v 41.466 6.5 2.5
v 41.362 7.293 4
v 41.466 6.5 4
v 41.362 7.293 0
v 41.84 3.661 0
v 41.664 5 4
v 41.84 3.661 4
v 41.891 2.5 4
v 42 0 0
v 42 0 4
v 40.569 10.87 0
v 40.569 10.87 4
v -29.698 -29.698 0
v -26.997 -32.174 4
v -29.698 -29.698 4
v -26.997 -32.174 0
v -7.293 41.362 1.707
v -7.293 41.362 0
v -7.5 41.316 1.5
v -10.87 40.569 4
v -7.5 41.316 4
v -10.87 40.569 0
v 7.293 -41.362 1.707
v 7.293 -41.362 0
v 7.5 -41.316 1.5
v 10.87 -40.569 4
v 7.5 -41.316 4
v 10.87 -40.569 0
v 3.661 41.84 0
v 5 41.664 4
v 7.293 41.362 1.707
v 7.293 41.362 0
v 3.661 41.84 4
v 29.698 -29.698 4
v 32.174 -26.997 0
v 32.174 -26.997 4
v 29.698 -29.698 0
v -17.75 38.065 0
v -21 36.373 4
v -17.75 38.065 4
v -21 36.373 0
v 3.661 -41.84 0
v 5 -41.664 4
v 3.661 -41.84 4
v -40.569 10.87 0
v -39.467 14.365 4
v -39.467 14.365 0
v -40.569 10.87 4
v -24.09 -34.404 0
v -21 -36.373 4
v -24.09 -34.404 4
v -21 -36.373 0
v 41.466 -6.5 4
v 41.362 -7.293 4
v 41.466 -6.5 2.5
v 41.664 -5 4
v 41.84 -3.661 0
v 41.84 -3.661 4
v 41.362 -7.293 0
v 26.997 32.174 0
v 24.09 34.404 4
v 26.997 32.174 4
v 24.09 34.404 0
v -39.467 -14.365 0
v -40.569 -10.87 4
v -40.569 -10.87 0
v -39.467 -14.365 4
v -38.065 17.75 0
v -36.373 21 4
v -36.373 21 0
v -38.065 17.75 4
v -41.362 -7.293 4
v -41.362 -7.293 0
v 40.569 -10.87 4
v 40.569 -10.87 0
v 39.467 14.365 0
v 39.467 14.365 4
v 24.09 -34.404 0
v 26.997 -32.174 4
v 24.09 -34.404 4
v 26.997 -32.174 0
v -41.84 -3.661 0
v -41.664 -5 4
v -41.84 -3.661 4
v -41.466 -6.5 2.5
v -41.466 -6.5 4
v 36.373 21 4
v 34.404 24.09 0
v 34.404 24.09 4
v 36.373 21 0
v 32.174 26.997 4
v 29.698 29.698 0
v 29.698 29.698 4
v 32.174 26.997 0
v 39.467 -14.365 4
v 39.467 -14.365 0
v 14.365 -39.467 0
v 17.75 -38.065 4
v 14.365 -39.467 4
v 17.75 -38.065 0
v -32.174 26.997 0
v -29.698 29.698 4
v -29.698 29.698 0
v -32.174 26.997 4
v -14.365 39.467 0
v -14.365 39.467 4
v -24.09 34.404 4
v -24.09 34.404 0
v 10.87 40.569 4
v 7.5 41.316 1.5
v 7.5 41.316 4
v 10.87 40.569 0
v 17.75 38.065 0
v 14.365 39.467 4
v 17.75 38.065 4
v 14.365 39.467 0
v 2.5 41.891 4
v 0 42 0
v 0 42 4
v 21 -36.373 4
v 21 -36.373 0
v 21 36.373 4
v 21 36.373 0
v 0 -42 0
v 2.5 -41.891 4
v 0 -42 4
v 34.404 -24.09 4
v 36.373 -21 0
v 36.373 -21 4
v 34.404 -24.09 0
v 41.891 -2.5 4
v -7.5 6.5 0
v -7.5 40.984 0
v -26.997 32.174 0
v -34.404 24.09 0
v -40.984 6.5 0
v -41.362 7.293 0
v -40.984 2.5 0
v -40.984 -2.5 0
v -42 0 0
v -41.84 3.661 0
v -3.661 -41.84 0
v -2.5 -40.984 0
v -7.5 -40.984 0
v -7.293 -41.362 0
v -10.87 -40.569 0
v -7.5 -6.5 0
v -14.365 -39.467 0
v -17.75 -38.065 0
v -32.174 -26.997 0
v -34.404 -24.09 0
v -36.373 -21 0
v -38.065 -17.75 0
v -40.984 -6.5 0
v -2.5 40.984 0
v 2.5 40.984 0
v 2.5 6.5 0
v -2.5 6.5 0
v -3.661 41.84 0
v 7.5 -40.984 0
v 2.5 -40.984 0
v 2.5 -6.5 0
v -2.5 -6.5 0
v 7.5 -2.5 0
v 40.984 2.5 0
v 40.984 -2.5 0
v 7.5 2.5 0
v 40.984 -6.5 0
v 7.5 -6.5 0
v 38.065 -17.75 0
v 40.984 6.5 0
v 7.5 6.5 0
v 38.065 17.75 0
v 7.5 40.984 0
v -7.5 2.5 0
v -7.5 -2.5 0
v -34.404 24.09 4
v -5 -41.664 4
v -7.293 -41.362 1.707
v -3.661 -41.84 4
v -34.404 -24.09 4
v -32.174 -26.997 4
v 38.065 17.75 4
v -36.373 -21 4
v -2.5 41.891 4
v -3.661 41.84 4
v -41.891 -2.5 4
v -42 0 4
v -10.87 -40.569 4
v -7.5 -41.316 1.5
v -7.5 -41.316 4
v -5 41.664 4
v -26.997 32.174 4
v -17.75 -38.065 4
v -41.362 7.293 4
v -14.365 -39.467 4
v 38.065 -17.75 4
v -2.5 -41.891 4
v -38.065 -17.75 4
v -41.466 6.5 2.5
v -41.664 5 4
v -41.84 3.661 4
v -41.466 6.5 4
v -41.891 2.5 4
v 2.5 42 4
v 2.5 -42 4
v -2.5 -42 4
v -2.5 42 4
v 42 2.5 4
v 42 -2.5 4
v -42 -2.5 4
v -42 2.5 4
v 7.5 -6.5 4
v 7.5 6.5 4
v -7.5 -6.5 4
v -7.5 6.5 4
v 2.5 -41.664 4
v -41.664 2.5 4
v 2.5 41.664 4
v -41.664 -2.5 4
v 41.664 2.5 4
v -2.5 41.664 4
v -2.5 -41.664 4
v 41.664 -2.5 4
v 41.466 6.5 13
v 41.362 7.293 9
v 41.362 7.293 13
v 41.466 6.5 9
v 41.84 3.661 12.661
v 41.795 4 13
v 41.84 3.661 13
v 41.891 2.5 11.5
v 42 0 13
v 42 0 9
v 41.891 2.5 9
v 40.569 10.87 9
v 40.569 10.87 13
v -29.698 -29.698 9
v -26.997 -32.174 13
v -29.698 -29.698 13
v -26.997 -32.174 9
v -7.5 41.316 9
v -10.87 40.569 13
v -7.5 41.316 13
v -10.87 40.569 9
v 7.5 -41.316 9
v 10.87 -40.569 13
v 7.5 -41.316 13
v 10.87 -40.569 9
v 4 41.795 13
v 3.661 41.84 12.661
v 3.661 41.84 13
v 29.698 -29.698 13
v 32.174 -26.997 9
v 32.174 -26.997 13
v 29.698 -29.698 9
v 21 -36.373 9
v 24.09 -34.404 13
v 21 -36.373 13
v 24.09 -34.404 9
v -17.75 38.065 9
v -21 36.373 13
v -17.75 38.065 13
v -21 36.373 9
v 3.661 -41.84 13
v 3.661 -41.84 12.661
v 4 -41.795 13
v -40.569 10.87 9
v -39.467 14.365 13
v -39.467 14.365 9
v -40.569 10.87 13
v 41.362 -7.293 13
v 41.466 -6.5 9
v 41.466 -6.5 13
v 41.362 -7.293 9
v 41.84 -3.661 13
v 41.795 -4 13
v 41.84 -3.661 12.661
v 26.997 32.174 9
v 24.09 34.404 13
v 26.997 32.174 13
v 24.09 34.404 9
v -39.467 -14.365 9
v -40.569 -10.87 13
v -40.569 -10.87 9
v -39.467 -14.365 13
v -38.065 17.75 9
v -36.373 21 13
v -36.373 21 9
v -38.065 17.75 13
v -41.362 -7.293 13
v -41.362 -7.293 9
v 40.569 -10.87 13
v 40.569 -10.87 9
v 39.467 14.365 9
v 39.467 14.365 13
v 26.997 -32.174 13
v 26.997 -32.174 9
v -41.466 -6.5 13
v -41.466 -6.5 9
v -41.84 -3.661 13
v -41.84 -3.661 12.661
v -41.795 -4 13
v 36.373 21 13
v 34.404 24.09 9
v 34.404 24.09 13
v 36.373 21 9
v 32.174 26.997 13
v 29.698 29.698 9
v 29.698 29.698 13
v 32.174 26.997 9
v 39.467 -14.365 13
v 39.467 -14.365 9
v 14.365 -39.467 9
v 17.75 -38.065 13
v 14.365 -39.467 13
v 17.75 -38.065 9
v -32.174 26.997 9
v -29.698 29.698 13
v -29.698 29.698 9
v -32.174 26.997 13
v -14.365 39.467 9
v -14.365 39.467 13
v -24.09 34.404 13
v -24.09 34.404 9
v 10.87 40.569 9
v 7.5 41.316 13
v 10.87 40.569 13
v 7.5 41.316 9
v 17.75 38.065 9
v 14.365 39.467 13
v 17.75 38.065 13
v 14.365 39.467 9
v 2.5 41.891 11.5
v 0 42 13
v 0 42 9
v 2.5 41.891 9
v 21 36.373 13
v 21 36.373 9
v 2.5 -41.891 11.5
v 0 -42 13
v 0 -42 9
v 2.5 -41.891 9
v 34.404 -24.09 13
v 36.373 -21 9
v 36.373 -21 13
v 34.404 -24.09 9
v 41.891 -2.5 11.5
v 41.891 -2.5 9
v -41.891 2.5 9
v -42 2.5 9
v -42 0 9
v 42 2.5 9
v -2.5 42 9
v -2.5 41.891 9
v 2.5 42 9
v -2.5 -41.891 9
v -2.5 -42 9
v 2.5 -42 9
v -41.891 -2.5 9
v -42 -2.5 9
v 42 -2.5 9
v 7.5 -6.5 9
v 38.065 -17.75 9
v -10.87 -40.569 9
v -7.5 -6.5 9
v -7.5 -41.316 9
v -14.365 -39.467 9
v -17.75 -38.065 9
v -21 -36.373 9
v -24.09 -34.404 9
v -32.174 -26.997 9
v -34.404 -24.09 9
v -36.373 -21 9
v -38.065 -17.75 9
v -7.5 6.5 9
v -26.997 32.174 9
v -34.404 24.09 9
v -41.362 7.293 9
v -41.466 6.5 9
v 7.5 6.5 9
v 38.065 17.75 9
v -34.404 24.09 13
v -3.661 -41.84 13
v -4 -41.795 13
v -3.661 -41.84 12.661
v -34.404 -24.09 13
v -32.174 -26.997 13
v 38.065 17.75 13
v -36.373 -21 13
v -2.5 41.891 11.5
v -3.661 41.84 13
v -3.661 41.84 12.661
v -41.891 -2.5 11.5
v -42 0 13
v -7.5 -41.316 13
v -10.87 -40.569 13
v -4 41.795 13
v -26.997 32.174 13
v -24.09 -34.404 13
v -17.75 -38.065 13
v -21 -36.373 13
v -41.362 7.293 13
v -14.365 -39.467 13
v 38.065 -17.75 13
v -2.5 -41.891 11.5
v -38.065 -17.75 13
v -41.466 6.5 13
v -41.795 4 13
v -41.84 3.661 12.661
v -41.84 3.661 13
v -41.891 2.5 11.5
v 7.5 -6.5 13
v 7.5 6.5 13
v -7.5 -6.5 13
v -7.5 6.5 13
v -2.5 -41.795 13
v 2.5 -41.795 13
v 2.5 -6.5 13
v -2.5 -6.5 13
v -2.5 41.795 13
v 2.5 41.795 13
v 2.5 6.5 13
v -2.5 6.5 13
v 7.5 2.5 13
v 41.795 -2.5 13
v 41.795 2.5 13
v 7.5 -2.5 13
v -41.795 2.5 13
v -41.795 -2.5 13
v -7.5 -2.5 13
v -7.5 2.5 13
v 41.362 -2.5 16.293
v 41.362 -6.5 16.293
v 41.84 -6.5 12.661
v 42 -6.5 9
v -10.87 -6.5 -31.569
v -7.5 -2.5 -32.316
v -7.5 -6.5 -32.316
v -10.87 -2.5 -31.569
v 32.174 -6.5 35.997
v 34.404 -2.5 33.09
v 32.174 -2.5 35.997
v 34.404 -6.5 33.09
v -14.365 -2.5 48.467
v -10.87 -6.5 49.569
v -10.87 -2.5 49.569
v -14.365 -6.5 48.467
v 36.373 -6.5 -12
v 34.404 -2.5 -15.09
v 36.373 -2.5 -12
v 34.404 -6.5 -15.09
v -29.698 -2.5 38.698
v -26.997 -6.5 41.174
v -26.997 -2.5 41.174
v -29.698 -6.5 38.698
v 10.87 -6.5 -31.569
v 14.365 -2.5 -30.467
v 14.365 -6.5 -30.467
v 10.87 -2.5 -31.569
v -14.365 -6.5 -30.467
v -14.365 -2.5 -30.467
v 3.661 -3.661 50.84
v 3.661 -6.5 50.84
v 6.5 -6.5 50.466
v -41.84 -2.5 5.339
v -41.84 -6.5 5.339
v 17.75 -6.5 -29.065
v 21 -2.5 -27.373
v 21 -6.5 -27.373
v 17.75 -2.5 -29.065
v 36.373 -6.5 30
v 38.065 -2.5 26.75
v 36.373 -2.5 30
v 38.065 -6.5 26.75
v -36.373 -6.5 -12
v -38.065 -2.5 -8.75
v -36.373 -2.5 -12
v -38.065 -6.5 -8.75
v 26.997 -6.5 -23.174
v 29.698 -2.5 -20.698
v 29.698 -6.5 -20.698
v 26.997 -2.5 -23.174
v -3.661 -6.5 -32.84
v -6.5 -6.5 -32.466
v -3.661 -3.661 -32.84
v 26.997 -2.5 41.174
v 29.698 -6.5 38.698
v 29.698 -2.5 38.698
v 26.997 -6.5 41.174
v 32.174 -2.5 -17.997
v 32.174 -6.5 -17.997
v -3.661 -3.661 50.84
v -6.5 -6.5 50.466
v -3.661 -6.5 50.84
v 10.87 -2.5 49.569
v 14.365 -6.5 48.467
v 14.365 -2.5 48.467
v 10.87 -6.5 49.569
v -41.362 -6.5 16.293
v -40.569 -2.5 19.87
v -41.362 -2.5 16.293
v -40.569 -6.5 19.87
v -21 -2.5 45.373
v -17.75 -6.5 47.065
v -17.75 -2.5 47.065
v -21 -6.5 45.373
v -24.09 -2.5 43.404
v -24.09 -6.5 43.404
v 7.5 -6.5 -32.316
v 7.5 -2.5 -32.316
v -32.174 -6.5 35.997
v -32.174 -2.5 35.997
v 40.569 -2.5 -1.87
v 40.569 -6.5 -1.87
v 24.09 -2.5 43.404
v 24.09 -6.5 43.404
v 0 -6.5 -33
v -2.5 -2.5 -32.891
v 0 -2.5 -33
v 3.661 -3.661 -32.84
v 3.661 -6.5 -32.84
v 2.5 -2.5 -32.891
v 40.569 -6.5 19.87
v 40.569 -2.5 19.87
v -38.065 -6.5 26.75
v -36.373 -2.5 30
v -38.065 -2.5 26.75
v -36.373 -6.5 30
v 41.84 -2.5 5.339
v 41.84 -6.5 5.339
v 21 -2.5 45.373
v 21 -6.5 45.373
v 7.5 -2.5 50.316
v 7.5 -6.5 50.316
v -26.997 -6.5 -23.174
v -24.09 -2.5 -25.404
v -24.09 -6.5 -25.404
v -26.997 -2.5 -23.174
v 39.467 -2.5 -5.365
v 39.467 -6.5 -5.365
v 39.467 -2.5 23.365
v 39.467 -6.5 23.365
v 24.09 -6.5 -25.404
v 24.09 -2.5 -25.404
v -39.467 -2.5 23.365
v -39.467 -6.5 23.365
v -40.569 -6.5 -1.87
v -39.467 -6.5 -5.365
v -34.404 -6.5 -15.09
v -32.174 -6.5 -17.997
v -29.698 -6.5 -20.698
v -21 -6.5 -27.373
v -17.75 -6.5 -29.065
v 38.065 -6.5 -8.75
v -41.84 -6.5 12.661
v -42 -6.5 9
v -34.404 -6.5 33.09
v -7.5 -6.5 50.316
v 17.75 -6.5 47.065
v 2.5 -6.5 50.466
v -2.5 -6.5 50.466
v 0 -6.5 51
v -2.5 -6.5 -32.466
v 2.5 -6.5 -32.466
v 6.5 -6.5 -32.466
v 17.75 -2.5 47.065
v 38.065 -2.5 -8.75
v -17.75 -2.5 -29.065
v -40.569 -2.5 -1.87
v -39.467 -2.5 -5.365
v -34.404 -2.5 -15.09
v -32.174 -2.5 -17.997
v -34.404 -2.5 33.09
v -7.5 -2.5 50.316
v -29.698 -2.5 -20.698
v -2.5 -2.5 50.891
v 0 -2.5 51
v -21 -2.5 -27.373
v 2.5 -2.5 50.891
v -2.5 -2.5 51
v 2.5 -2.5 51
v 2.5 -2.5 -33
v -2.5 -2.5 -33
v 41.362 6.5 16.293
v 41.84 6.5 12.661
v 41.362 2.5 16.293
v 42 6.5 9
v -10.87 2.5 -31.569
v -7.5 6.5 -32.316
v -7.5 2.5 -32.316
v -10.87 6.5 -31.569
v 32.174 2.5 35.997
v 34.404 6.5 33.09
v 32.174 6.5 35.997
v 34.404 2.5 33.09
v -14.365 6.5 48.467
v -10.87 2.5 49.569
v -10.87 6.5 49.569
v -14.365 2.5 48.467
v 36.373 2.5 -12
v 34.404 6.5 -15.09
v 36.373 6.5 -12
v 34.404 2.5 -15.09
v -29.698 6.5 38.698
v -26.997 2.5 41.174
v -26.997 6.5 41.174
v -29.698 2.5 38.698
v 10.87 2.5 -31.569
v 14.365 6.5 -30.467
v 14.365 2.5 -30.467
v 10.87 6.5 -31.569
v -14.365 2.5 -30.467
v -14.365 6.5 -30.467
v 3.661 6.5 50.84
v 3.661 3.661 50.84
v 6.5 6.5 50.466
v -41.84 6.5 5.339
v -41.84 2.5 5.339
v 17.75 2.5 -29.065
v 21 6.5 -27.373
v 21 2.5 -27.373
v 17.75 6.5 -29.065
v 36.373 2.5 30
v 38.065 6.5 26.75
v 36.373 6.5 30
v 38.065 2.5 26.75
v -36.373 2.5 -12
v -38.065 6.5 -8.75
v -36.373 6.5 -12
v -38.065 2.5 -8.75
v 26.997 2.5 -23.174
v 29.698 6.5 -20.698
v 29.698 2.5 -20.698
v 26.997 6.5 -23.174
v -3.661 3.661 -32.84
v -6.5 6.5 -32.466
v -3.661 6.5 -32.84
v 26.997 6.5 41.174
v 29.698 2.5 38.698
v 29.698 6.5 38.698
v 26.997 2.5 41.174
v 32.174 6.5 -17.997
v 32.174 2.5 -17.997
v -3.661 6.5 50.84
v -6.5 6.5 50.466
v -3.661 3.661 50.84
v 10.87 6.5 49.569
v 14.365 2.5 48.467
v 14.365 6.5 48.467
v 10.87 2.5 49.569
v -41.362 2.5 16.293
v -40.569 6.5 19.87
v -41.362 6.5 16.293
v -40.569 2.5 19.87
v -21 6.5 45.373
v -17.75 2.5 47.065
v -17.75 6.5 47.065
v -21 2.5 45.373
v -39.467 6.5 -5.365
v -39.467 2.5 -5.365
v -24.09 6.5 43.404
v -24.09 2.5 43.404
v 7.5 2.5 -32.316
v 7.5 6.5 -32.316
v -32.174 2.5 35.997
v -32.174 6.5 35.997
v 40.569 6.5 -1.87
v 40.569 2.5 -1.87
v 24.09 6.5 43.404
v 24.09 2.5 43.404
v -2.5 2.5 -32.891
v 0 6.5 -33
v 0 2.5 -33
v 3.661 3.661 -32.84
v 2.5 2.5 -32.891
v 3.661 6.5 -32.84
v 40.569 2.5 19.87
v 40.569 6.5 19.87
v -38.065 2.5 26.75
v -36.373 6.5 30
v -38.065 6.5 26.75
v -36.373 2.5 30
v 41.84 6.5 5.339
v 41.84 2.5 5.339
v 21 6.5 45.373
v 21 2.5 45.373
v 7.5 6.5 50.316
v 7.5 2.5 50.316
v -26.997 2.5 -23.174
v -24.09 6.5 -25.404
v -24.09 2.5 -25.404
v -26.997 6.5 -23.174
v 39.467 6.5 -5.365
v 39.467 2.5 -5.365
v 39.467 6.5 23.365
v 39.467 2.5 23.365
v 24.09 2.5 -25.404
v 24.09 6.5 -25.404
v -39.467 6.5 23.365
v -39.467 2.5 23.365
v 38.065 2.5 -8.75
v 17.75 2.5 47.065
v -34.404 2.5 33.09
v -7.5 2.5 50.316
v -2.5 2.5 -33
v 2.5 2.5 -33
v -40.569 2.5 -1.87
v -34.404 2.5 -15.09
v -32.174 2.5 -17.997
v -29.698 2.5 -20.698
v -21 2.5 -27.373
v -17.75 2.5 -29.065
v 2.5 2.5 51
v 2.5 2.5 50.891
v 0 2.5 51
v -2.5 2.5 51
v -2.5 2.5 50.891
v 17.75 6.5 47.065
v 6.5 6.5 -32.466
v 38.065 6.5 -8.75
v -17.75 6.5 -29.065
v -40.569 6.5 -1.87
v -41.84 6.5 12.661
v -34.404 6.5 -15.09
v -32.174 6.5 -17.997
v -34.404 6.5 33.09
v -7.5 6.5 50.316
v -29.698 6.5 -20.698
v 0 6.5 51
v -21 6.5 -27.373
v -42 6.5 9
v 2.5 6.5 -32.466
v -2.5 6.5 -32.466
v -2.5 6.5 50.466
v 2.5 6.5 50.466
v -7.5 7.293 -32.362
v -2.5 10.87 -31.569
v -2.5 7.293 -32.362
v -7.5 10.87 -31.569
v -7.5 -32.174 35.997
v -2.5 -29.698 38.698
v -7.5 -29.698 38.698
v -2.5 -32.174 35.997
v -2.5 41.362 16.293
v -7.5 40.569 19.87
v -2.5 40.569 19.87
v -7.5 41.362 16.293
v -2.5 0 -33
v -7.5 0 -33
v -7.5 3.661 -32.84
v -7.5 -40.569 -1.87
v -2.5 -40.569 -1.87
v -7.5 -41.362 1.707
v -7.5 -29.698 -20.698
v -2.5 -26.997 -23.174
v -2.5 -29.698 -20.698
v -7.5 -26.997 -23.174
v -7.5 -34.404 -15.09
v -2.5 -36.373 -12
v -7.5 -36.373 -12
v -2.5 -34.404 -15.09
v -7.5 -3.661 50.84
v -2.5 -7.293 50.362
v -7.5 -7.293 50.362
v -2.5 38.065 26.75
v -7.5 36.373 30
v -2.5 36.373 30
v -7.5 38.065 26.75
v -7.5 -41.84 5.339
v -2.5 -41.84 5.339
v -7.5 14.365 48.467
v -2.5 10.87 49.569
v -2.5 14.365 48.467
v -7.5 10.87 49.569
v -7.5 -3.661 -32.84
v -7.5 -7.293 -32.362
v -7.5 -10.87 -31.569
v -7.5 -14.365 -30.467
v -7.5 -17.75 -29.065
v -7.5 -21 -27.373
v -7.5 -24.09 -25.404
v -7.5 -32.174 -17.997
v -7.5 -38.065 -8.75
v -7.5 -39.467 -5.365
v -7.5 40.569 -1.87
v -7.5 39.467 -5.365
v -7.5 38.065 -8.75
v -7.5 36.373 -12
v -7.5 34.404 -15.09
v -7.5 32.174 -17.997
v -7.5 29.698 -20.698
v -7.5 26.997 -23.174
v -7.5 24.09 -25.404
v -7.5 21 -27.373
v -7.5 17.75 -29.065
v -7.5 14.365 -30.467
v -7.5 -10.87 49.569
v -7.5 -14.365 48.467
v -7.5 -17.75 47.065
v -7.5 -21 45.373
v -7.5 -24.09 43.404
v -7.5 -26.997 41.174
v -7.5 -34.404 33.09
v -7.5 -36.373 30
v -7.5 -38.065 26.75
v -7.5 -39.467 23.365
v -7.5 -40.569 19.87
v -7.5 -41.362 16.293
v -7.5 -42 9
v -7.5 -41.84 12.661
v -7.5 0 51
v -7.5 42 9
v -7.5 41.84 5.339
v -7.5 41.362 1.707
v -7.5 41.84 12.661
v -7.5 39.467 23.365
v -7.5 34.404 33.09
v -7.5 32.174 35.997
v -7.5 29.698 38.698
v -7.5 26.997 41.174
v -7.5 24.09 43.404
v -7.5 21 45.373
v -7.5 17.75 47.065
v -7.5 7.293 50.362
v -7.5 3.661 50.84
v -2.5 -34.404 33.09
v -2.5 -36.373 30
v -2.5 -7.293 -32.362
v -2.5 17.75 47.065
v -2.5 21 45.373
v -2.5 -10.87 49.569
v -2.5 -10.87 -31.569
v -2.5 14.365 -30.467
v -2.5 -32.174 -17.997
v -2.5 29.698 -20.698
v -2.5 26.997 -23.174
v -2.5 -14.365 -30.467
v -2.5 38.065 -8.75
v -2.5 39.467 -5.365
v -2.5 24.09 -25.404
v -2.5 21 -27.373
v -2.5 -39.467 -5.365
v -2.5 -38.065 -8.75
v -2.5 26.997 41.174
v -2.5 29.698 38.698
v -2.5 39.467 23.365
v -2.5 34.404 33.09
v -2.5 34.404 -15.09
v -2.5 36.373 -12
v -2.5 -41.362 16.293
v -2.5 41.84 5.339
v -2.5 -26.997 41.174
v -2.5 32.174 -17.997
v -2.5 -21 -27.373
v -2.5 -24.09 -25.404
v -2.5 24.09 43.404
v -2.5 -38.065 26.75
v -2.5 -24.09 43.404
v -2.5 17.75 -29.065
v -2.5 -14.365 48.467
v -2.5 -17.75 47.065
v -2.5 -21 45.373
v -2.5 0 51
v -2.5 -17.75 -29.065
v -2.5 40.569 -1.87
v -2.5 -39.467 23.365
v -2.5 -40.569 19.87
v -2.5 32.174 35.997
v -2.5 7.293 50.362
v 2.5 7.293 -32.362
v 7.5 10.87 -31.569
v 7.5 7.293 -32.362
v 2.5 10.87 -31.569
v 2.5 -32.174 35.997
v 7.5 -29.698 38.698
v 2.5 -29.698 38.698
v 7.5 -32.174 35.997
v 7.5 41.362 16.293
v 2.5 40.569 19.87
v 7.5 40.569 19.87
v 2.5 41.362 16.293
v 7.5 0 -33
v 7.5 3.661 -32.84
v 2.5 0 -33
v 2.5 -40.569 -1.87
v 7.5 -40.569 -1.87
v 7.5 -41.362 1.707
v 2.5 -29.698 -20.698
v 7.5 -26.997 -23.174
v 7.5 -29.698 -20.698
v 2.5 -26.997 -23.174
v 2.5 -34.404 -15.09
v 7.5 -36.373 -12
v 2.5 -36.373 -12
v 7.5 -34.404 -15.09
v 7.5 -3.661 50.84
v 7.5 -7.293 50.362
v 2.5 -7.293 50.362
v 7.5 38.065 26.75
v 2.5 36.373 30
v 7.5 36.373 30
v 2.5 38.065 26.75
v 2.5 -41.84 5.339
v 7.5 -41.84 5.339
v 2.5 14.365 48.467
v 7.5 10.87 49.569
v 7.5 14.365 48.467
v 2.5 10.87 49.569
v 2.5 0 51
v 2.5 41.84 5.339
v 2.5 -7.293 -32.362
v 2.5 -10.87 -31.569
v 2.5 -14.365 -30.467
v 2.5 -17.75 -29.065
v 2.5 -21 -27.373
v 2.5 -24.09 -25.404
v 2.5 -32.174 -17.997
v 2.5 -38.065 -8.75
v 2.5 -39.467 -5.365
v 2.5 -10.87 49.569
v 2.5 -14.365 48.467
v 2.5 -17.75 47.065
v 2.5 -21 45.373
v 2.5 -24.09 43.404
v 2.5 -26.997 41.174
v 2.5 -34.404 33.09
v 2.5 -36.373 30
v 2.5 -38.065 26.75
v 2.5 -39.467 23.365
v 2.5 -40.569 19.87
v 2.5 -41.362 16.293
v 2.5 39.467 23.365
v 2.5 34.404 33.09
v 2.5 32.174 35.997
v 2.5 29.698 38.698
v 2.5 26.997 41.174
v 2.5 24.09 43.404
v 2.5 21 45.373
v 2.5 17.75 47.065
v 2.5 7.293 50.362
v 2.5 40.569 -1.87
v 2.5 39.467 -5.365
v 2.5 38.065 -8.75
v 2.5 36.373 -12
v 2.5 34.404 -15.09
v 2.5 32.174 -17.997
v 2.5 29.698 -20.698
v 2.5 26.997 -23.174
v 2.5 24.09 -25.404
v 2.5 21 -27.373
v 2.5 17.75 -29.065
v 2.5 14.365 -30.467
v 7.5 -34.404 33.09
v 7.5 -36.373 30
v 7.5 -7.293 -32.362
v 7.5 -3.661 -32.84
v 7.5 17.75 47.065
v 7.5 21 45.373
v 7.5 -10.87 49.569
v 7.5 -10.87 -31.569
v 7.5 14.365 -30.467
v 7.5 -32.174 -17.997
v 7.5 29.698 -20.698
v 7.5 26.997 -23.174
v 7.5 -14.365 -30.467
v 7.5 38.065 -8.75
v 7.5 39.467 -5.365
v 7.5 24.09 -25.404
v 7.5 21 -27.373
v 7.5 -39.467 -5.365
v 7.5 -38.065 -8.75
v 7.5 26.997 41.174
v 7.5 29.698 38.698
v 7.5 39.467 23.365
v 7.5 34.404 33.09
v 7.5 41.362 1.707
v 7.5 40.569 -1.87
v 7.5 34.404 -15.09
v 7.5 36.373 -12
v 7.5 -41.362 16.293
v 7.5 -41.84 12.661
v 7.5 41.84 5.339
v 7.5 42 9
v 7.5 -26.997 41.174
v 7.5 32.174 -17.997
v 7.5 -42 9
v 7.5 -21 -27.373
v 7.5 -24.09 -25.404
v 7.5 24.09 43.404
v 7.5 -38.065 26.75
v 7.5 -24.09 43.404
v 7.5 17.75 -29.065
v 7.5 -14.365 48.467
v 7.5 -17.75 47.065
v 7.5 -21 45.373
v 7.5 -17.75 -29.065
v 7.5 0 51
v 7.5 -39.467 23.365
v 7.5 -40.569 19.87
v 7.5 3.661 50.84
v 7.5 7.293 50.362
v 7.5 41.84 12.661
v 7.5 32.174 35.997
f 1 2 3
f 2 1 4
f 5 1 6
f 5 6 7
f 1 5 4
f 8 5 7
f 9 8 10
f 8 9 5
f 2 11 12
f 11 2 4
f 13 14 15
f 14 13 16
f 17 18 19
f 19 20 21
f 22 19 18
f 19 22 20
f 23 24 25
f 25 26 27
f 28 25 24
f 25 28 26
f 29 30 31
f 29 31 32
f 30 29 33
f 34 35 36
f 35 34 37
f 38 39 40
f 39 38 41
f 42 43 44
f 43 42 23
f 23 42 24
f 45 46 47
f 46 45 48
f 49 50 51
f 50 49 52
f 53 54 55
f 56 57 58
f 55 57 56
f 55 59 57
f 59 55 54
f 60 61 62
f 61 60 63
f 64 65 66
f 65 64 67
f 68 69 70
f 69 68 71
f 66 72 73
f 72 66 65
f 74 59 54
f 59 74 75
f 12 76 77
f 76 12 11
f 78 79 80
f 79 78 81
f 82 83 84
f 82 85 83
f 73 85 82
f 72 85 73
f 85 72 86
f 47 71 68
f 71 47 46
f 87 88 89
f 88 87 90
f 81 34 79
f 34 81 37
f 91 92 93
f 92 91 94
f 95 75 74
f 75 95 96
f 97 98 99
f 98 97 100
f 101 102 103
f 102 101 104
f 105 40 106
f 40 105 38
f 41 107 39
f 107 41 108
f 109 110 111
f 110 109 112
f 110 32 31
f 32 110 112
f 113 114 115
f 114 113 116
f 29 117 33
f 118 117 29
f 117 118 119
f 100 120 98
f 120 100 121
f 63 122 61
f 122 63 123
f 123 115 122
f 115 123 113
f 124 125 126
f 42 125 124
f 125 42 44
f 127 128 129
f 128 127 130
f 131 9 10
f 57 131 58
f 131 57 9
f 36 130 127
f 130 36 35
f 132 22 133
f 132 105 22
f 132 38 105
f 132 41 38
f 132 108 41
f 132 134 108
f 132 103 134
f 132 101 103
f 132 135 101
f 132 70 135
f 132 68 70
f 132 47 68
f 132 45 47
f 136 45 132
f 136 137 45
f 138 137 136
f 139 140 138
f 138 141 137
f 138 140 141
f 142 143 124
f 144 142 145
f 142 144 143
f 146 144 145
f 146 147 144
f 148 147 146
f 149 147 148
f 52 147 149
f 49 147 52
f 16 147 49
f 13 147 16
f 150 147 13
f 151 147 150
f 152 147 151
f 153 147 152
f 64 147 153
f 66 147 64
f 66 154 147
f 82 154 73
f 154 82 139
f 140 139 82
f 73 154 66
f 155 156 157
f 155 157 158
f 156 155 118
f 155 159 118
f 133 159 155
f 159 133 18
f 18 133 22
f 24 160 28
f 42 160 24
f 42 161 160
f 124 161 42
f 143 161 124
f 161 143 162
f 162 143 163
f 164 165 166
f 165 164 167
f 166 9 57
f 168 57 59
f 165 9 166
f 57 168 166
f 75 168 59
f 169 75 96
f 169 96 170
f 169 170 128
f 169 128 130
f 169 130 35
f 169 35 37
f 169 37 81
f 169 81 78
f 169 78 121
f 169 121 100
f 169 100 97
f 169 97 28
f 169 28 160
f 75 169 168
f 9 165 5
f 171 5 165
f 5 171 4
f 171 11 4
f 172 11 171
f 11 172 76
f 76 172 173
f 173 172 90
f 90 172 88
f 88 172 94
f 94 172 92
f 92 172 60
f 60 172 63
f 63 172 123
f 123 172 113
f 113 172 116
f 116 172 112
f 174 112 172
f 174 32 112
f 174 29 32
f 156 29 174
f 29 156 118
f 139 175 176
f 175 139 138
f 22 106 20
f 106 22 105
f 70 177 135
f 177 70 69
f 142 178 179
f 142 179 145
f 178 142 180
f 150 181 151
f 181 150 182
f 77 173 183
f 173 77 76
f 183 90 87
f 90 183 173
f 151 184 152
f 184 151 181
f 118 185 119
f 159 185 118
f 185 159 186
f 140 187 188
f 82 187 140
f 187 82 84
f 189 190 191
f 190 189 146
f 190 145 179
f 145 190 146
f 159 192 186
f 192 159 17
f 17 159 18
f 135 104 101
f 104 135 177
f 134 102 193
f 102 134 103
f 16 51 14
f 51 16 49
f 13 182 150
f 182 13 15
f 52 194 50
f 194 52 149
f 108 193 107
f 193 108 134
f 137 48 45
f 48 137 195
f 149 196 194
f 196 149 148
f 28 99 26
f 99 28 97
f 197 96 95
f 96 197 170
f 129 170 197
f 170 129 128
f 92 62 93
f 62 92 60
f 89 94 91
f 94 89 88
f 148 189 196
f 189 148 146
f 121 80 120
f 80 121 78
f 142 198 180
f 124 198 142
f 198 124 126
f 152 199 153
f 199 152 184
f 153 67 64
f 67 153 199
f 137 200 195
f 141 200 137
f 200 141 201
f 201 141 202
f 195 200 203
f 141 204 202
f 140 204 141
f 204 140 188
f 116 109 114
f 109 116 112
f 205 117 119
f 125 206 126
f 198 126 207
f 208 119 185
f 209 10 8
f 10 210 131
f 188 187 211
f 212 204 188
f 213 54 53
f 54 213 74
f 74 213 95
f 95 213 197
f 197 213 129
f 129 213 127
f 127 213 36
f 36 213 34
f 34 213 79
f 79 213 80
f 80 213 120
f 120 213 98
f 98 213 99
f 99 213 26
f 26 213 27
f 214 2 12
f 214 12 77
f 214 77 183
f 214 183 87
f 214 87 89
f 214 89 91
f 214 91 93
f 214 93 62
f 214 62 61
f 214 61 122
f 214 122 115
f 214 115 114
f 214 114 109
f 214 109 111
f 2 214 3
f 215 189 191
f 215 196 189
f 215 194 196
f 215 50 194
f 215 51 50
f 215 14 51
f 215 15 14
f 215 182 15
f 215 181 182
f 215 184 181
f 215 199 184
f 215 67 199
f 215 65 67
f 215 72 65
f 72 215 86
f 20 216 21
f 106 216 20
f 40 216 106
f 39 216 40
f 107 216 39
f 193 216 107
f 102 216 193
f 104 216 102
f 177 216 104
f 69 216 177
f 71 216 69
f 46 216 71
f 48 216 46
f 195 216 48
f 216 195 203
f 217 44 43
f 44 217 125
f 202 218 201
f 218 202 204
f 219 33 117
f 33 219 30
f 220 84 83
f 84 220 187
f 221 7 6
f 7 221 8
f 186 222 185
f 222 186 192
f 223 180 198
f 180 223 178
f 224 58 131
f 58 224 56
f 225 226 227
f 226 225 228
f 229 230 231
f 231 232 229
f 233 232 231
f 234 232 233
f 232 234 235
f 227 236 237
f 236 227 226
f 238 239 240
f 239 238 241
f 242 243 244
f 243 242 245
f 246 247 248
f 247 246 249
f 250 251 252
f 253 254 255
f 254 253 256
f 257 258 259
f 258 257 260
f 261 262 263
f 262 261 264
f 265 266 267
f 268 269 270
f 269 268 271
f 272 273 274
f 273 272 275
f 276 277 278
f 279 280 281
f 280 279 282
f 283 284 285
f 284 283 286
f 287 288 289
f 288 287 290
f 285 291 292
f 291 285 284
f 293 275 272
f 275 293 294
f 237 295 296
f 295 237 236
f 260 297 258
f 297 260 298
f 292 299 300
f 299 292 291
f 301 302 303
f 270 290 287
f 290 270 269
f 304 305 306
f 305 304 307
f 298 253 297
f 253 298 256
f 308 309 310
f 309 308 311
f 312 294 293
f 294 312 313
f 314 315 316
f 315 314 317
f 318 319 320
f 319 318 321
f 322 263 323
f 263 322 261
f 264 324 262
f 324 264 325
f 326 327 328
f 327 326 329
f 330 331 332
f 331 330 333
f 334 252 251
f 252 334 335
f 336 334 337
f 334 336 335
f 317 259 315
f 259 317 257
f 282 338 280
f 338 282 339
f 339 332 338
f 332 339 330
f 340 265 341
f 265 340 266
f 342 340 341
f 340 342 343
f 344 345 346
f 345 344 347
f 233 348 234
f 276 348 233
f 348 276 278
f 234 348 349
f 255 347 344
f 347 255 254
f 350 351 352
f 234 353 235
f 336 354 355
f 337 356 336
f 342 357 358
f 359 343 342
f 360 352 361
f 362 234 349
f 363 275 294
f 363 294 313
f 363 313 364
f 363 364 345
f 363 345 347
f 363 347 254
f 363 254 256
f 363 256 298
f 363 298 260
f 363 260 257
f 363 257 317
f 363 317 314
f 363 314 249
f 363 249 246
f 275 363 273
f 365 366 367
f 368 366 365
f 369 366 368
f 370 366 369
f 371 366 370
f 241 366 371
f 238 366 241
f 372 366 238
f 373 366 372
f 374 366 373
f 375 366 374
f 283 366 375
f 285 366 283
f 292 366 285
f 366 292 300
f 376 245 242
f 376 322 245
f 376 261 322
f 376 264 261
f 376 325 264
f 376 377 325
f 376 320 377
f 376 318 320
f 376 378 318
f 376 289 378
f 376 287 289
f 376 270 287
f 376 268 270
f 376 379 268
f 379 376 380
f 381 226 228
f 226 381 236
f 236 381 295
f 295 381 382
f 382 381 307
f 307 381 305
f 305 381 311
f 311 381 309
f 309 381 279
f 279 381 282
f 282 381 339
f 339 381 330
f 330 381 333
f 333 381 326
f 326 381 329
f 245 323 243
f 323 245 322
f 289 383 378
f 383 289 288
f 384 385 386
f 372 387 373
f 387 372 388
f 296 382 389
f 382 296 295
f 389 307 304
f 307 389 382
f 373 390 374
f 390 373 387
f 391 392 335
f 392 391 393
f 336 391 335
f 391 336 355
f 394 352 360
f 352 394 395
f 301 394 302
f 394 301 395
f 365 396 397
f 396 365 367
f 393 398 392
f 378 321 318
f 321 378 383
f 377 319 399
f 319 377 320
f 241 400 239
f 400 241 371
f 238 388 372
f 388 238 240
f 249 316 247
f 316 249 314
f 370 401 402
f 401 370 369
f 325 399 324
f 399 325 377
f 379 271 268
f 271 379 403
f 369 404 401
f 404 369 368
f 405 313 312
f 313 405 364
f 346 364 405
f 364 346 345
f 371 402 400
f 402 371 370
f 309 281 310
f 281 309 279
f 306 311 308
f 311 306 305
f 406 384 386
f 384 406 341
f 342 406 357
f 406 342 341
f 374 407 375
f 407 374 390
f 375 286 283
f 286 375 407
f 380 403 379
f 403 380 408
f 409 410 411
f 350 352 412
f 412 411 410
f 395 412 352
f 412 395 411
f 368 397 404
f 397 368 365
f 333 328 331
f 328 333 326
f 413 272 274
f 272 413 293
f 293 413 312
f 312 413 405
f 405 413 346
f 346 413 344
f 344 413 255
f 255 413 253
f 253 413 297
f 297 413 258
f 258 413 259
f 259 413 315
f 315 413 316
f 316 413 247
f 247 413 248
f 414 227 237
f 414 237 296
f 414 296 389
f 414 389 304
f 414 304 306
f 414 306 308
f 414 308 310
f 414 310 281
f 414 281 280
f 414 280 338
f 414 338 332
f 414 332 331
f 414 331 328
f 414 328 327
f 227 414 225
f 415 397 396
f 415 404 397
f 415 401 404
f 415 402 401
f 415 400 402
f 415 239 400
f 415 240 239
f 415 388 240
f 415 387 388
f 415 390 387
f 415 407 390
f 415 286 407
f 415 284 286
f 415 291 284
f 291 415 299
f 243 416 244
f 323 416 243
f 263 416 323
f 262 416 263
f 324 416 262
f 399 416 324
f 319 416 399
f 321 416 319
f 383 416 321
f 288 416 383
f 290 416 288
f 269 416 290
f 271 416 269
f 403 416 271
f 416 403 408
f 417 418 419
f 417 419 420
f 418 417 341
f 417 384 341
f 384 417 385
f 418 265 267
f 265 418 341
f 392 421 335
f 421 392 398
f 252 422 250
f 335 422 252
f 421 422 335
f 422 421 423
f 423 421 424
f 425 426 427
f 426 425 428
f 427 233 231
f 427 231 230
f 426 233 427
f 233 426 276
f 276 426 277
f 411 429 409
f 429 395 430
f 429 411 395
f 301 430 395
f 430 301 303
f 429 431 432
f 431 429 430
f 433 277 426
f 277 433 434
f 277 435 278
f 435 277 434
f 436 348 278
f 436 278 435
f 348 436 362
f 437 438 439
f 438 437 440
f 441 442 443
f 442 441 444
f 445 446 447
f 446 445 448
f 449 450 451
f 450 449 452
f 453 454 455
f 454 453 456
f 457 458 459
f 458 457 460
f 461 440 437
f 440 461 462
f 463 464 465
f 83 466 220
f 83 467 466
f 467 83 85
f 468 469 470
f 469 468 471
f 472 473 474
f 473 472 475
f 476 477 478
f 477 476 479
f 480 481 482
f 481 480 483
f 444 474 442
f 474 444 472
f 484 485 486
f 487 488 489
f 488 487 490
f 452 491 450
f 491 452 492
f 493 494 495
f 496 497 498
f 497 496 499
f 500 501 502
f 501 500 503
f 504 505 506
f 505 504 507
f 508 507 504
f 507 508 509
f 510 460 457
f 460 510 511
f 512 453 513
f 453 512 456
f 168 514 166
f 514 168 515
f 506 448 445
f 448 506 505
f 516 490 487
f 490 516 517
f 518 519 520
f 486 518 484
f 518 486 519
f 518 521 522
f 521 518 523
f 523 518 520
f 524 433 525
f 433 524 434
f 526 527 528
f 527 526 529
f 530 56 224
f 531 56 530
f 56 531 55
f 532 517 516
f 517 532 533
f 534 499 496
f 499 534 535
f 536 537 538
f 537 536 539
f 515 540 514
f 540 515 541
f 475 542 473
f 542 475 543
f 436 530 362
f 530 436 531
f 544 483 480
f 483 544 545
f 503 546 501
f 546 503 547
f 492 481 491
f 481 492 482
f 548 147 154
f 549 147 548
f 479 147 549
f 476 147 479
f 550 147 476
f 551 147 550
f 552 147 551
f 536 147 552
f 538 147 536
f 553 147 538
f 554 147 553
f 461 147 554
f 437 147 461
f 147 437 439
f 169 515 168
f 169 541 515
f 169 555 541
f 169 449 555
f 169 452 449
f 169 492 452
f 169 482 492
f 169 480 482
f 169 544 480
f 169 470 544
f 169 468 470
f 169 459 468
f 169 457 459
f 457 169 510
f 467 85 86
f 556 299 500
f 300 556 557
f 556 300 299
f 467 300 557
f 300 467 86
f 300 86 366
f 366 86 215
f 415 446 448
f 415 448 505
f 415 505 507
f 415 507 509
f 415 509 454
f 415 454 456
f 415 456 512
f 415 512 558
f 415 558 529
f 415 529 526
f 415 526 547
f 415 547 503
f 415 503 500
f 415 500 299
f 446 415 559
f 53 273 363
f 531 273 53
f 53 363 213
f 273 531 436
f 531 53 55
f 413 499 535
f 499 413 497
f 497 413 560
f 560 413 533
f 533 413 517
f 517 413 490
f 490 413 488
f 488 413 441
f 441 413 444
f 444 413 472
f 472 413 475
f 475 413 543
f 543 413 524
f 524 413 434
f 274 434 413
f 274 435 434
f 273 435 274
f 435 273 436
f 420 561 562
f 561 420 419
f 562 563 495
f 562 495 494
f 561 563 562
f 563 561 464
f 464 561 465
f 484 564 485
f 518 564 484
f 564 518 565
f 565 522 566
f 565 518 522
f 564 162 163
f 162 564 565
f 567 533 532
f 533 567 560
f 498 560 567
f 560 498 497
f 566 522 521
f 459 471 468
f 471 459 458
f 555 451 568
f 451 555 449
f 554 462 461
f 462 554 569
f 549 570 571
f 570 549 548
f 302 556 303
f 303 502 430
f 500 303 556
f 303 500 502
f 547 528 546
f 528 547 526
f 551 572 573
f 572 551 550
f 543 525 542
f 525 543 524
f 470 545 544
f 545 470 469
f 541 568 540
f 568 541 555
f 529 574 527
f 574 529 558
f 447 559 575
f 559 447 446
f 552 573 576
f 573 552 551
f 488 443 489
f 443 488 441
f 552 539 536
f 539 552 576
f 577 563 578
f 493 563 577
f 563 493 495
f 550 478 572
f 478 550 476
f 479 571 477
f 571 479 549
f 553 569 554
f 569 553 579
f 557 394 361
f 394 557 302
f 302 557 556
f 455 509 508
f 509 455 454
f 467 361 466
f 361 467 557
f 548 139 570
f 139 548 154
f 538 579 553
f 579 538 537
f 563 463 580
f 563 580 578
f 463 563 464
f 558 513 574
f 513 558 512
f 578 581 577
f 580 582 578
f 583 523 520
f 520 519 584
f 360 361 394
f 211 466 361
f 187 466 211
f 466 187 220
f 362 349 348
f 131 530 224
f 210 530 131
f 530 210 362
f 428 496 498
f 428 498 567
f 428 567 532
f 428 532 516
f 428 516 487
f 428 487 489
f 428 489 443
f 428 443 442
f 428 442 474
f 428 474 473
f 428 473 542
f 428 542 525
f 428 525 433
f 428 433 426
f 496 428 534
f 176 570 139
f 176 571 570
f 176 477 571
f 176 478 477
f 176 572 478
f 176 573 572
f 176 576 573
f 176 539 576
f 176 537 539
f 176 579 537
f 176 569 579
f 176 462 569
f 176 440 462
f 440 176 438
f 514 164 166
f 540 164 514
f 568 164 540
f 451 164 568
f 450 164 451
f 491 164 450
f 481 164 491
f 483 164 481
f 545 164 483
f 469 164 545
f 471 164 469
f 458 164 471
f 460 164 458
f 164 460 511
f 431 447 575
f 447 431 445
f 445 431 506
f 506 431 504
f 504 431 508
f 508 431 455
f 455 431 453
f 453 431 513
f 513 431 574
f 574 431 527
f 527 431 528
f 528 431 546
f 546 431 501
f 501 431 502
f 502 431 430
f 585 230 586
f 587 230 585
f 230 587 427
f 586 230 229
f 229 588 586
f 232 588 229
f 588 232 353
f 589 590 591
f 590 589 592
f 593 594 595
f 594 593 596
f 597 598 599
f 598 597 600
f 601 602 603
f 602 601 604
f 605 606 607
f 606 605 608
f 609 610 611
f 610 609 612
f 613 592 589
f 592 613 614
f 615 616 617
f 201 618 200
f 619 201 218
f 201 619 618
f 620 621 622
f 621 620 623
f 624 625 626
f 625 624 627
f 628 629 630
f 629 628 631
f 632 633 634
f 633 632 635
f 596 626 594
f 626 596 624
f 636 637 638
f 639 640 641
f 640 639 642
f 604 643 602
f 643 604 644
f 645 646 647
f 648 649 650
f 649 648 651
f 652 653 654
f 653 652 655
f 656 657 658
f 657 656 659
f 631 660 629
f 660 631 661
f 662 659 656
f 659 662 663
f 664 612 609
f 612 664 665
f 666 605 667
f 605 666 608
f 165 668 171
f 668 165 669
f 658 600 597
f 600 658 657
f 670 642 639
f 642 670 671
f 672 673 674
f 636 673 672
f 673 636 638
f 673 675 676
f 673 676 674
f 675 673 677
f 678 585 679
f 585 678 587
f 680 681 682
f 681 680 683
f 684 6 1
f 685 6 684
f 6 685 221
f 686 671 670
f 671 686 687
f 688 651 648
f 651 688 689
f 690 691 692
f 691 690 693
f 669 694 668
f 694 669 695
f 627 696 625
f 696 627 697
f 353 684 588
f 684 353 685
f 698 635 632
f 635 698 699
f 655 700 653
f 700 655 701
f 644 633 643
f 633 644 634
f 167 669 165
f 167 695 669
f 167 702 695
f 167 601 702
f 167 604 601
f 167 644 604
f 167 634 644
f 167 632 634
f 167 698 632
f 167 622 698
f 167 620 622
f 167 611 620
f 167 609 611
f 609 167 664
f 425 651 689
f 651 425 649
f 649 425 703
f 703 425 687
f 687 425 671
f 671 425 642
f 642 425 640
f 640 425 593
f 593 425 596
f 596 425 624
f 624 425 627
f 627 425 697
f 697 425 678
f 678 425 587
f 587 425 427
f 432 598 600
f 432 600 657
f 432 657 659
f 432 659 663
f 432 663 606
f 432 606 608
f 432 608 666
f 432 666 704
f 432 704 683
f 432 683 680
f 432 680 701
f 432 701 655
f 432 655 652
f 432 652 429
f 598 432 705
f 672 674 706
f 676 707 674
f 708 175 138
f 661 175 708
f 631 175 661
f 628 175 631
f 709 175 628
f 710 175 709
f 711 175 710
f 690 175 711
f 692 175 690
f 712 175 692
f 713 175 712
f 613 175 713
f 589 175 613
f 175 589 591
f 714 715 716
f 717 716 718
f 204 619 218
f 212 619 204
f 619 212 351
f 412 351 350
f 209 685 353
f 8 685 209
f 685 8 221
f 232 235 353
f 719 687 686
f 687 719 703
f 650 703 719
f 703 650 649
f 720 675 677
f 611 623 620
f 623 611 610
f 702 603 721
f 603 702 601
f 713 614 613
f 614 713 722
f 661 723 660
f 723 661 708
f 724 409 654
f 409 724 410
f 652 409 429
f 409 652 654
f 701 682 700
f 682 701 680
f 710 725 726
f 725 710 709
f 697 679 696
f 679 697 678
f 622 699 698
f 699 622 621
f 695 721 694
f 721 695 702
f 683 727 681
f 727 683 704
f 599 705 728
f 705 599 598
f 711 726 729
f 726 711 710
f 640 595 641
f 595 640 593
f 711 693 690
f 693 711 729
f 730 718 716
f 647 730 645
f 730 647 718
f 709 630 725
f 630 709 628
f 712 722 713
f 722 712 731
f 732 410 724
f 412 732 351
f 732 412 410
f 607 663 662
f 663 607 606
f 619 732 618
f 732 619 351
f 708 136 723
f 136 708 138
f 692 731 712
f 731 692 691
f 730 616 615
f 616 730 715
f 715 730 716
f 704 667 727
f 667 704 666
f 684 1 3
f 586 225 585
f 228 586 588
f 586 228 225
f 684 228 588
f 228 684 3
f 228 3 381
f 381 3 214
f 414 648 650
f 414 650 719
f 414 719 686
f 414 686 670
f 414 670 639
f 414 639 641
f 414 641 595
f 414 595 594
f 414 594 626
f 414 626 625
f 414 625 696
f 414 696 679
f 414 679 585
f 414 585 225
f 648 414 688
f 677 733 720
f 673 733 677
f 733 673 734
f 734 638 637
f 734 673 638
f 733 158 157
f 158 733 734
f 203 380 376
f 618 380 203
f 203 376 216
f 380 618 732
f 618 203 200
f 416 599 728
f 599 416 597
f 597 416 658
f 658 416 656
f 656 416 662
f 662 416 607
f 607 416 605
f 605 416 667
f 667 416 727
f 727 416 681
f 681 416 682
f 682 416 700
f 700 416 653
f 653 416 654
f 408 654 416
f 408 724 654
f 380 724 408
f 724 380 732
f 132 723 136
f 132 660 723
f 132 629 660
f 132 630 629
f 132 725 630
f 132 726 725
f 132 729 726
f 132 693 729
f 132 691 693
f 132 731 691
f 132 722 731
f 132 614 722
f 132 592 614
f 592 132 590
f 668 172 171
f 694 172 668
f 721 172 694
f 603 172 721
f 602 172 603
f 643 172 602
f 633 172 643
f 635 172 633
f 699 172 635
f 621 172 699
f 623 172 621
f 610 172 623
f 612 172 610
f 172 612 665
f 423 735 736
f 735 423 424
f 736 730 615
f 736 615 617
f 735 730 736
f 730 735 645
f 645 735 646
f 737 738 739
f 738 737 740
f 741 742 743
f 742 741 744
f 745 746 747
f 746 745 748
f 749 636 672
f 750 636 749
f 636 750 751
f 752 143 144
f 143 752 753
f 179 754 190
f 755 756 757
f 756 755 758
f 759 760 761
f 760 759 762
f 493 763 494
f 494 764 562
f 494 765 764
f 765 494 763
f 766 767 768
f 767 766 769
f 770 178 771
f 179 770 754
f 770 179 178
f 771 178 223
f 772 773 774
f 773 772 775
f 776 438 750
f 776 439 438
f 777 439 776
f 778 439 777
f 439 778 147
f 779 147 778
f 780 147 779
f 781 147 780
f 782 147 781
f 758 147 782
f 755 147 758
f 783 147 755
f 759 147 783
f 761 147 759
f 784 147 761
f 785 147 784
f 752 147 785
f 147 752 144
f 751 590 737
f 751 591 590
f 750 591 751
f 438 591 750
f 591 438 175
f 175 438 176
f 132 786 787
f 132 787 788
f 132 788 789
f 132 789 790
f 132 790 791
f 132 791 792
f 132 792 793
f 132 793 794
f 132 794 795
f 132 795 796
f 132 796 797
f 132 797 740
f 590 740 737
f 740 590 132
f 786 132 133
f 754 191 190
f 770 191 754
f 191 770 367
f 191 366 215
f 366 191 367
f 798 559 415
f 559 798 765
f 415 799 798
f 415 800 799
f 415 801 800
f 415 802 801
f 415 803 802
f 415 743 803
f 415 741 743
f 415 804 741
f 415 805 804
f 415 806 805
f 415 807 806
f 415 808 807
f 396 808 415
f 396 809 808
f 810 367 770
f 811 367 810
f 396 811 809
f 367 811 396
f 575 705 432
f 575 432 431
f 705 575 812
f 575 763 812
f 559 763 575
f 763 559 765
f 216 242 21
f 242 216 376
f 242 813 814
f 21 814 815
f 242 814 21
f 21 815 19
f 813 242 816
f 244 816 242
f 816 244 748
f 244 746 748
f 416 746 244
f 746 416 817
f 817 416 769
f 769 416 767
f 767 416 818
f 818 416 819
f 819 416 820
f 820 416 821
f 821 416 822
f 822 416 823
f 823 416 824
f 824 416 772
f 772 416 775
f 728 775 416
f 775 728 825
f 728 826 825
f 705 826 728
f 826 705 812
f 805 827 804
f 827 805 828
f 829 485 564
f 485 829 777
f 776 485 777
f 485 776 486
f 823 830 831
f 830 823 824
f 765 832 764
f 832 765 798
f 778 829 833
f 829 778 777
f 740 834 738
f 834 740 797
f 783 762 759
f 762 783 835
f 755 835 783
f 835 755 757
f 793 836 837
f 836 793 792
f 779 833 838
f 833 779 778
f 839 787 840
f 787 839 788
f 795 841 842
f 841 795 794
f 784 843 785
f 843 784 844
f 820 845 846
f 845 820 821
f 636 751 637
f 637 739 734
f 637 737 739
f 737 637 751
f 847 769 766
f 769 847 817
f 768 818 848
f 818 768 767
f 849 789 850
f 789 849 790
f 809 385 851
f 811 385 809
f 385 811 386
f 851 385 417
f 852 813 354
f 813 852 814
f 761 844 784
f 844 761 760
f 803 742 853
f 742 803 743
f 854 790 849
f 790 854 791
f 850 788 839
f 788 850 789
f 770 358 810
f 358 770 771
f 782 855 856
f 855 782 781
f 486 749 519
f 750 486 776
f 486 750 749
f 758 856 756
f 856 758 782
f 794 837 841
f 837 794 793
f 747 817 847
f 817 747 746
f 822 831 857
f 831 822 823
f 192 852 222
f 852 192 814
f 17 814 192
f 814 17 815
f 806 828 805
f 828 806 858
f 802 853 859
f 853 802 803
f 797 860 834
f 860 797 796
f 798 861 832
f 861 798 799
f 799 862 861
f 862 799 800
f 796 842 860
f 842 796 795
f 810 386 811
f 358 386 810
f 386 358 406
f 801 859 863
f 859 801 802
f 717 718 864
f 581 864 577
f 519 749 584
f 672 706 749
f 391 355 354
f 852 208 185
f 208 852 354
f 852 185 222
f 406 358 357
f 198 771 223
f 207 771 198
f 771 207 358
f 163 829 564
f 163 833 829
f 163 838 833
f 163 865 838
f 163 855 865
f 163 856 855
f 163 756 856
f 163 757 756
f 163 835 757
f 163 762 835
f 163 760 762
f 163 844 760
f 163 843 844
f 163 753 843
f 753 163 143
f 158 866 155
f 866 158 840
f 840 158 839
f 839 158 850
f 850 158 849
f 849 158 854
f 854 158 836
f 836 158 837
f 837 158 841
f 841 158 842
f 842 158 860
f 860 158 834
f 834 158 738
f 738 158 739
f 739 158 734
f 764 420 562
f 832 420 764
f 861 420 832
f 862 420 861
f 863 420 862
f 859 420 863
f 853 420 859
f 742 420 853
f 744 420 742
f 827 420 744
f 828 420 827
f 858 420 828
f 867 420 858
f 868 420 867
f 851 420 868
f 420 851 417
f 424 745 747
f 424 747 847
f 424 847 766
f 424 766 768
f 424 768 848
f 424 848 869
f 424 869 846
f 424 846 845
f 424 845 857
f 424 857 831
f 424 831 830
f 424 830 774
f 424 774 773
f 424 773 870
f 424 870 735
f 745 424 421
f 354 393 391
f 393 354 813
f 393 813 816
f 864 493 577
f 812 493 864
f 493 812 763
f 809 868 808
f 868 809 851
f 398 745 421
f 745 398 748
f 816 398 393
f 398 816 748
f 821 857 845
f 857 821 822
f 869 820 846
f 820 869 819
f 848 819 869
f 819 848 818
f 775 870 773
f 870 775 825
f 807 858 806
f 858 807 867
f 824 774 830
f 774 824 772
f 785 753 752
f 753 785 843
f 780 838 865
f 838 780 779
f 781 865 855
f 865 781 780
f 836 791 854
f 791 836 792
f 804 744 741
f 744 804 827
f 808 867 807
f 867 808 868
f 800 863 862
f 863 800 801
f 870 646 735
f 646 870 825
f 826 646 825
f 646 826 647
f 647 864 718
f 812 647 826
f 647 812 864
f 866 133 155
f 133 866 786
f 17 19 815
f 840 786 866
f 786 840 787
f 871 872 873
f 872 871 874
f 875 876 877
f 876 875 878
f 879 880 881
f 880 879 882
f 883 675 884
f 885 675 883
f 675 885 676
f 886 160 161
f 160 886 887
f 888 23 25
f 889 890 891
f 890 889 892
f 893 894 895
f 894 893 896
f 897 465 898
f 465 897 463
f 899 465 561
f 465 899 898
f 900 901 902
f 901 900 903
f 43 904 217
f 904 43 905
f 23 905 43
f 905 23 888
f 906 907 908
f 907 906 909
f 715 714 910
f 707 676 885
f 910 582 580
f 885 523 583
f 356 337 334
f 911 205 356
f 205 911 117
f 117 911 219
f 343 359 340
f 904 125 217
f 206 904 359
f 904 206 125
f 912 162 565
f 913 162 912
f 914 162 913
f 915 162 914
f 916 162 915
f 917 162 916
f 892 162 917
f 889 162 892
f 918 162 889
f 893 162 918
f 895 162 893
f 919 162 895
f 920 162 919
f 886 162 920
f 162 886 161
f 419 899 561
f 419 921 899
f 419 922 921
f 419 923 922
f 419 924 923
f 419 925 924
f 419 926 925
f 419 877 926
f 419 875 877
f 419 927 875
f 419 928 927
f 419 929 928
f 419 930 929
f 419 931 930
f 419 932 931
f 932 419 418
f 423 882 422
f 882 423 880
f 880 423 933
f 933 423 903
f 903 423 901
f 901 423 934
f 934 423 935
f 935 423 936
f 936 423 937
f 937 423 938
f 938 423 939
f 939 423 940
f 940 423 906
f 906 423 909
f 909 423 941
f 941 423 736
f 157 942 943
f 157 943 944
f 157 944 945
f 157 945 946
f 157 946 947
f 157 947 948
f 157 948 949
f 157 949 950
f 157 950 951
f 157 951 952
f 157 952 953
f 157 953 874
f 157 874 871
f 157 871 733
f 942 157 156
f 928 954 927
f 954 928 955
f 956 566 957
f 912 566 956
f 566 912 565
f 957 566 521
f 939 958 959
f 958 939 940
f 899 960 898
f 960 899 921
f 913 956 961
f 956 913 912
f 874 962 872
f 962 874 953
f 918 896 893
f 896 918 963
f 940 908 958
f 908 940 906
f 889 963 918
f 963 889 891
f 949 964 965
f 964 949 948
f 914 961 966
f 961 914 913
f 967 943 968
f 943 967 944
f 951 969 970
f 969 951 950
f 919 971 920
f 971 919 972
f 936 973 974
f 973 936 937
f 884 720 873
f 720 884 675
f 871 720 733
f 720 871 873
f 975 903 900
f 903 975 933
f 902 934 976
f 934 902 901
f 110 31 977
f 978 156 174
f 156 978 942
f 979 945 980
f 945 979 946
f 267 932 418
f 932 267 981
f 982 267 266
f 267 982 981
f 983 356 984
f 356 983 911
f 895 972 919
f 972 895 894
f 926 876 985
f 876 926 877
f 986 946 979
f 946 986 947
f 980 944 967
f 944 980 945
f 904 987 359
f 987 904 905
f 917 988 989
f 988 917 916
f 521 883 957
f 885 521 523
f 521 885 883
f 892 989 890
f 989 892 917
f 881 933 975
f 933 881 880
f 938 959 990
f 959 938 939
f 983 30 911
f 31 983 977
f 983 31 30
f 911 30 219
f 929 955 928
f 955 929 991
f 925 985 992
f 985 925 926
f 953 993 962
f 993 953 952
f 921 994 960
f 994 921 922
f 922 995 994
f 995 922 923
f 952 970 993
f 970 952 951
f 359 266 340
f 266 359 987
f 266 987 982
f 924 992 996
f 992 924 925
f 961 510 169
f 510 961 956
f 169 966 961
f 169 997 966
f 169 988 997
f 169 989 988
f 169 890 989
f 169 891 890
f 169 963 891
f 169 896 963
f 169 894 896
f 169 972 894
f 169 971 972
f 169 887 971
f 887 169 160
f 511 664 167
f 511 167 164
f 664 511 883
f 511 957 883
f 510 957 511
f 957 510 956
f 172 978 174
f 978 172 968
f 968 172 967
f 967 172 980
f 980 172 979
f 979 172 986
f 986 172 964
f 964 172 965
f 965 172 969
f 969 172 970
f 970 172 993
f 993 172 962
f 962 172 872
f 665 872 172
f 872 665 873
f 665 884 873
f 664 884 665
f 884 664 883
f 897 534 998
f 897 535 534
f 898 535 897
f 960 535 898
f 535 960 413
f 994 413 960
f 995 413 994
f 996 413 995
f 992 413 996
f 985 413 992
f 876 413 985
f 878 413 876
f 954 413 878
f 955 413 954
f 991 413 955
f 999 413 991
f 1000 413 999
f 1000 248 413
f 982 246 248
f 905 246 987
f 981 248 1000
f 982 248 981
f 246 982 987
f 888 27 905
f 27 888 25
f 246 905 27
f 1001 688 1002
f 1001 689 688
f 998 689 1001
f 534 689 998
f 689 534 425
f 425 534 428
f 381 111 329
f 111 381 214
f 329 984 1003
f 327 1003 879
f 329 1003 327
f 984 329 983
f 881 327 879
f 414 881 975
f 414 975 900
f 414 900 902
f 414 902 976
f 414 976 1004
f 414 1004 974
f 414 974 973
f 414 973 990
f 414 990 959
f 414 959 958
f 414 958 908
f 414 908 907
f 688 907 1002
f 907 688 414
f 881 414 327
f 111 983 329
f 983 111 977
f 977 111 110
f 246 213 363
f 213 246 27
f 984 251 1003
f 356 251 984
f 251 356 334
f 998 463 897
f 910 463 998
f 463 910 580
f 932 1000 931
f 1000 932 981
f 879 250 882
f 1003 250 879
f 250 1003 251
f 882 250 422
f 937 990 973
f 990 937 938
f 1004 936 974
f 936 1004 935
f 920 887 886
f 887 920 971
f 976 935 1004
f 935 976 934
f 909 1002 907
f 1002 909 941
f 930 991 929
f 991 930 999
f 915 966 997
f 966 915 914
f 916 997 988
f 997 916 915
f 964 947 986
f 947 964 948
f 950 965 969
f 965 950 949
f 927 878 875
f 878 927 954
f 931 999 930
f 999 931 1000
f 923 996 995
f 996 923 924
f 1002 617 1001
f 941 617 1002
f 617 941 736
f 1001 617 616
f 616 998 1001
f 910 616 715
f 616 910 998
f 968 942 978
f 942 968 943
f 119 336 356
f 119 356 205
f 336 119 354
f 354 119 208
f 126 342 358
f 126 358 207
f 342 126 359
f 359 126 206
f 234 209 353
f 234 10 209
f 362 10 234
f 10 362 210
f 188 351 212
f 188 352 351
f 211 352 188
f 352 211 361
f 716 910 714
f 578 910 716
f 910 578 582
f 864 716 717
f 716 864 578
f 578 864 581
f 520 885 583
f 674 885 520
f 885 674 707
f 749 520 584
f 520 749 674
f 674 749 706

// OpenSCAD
// making a bracket which consists of a complete cylinder sandwich and a orthogonal 4mm tall half cylinder sandwich with various reinforcements
// two cylinders with 5mm spacing, 4 rounded rectangles with heighth = radius,  length = diameter and radius, 4mm width
// 


pad = 0.1;        	// padding to maintain manifold
wall_width = 4;         // height of cylinders
diameter = 84;  //  
radius = 84/2; 
spacing = 5;






// difference(){
wireshelf_ball();
// translate([-42,-42,-51.9]) cube([85,85,52.1]);
//}

// here <----  add noisebridge relief logo to the base and make watertight

module wireshelf_ball()
{

translate([0,0,0]) cylinder(wall_width,42,42, $fa=5, $fs=0.1);  // bottom cylinder
translate([0,0,wall_width+spacing]) cylinder(wall_width,42,42, $fa=5, $fs=0.1);  // top cylinder, offset 4 plus spacing of 5mm


translate([0,0-2.5,9]) rotate([90,0,0]) cylinder(wall_width,42,42, $fa=5, $fs=0.1);  //  Y side rectangle 1
translate([0,wall_width+2.5,9]) rotate([90,0,0]) cylinder(wall_width,42,42, $fa=5, $fs=0.1);  //  Y side cylinder 2



translate([-5-2.5,0,9]) rotate([0,90,0]) cylinder(5,42,42,$fa=5, $fs=0.1);  // X side cylinder 1
translate([0+2.5,0,9]) rotate([0,90,0]) cylinder(5,42,42, $fa=5, $fs=0.1);  // X side cylinder 2



// add a rectangle in to make the center solid 
// this can be done as the intersection of the 4 cylinders....
// or as a couple of rectangles that get translated


//rectangles that get tranlated to fill in btwn intersections

translate([-2.5,-42,4]) cube([5,84,5]);          // Y axis filler rod
translate([-42,-2.5,4])  cube([84,5,5]);       // X axis filler rod  (shift up by height of Cylinder)
translate([-2.5,-2.5,-33])  cube([5,5,84]);  // Z axis filler rod

}
